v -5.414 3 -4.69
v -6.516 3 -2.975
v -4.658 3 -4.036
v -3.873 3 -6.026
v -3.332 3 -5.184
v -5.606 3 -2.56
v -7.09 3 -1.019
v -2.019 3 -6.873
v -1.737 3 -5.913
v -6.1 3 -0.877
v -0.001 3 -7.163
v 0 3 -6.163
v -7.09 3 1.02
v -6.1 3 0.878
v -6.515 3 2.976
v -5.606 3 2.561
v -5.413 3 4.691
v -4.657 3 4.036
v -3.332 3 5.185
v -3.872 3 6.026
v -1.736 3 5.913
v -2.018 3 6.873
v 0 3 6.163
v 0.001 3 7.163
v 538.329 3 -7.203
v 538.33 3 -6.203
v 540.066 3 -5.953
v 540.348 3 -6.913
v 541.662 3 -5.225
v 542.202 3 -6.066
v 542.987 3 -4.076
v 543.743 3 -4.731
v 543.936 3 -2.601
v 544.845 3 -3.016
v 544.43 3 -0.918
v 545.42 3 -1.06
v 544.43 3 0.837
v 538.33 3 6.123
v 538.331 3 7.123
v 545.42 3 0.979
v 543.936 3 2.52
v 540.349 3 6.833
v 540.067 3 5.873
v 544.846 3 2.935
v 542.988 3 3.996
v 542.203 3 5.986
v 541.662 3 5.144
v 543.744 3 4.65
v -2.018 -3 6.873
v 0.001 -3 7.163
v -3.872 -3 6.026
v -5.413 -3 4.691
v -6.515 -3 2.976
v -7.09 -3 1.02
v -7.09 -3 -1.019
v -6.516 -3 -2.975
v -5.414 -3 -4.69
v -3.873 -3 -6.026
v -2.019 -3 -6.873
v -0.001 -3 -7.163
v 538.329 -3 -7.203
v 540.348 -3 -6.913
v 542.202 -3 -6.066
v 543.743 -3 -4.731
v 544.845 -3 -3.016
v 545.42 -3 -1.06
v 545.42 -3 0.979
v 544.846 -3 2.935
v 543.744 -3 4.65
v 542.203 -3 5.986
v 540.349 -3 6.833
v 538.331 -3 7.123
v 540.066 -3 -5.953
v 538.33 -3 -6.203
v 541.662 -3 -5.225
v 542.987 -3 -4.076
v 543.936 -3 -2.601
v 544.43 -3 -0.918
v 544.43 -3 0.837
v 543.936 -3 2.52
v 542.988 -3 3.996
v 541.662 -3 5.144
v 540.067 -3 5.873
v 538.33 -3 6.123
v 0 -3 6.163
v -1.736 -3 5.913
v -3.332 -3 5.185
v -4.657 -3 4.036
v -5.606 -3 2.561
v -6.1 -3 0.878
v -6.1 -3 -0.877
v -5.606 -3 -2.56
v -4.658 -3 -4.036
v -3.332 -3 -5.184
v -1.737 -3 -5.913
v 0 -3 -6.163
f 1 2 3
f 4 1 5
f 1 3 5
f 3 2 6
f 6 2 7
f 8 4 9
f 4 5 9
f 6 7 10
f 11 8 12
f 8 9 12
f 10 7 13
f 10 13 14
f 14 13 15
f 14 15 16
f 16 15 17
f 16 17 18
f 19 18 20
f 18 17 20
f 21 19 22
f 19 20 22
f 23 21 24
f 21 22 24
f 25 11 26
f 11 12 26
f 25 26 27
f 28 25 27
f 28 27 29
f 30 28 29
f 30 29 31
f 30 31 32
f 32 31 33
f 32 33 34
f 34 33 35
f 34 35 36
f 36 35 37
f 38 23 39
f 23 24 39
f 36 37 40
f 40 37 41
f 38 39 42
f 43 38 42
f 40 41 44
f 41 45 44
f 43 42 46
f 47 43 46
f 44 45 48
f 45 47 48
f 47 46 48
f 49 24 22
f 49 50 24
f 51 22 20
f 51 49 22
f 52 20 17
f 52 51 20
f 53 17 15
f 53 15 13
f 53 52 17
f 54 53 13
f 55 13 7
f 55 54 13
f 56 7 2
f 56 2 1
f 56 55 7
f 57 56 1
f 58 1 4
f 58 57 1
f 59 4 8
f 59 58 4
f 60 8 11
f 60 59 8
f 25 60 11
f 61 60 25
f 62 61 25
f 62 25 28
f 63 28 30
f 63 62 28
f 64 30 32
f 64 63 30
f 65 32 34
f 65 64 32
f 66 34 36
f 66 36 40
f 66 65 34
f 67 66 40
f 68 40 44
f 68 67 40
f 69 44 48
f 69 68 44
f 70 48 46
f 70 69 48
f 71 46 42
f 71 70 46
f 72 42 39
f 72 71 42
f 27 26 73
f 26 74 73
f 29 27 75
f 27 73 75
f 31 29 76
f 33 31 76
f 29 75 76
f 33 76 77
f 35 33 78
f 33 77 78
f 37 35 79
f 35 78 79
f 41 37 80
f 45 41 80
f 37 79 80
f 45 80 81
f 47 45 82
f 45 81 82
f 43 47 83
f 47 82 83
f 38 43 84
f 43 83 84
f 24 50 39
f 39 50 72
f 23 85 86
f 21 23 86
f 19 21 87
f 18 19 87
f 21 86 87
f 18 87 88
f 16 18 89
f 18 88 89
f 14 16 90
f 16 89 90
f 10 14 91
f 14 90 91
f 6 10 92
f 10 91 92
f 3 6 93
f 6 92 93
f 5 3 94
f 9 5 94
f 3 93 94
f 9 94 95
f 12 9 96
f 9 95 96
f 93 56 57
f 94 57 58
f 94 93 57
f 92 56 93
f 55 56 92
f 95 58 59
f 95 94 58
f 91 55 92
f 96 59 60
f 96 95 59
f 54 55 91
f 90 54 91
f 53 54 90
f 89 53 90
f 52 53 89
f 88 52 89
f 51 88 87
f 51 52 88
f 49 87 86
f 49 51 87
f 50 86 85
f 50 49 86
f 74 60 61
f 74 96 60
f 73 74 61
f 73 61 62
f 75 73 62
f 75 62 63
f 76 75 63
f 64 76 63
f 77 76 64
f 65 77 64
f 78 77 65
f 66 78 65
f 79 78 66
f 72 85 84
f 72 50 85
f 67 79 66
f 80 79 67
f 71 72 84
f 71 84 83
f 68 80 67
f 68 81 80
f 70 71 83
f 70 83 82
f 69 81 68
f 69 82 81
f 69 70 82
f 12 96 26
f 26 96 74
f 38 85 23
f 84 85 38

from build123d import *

# Parameters (mm, degrees)
PAD010_DEPTH = 3


with BuildPart() as part:
    # Sketch022 → Pad010 (new body, symmetric)
    with BuildSketch(Plane.XZ):
        with BuildLine():
            ThreePointArc((0.000532, 7.163), (-7.163, 0.000532), (-0.000532, -7.163))
            Line((-0.000532, -7.163), (538.329468, -7.203))
            ThreePointArc((538.329468, -7.203), (545.493, -0.040532), (538.330532, 7.123))
            Line((0.000532, 7.163), (538.330532, 7.123))
        make_face()
        with BuildLine():
            ThreePointArc((0.000458, 6.163), (-6.163, 0.000458), (-0.000458, -6.163))
            Line((-0.000458, -6.163), (538.329542, -6.203))
            ThreePointArc((538.329542, -6.203), (544.493, -0.040458), (538.330458, 6.123))
            Line((0.000458, 6.163), (538.330458, 6.123))
        make_face(mode=Mode.SUBTRACT)
    extrude(amount=PAD010_DEPTH, both=True)


solid = part.part
